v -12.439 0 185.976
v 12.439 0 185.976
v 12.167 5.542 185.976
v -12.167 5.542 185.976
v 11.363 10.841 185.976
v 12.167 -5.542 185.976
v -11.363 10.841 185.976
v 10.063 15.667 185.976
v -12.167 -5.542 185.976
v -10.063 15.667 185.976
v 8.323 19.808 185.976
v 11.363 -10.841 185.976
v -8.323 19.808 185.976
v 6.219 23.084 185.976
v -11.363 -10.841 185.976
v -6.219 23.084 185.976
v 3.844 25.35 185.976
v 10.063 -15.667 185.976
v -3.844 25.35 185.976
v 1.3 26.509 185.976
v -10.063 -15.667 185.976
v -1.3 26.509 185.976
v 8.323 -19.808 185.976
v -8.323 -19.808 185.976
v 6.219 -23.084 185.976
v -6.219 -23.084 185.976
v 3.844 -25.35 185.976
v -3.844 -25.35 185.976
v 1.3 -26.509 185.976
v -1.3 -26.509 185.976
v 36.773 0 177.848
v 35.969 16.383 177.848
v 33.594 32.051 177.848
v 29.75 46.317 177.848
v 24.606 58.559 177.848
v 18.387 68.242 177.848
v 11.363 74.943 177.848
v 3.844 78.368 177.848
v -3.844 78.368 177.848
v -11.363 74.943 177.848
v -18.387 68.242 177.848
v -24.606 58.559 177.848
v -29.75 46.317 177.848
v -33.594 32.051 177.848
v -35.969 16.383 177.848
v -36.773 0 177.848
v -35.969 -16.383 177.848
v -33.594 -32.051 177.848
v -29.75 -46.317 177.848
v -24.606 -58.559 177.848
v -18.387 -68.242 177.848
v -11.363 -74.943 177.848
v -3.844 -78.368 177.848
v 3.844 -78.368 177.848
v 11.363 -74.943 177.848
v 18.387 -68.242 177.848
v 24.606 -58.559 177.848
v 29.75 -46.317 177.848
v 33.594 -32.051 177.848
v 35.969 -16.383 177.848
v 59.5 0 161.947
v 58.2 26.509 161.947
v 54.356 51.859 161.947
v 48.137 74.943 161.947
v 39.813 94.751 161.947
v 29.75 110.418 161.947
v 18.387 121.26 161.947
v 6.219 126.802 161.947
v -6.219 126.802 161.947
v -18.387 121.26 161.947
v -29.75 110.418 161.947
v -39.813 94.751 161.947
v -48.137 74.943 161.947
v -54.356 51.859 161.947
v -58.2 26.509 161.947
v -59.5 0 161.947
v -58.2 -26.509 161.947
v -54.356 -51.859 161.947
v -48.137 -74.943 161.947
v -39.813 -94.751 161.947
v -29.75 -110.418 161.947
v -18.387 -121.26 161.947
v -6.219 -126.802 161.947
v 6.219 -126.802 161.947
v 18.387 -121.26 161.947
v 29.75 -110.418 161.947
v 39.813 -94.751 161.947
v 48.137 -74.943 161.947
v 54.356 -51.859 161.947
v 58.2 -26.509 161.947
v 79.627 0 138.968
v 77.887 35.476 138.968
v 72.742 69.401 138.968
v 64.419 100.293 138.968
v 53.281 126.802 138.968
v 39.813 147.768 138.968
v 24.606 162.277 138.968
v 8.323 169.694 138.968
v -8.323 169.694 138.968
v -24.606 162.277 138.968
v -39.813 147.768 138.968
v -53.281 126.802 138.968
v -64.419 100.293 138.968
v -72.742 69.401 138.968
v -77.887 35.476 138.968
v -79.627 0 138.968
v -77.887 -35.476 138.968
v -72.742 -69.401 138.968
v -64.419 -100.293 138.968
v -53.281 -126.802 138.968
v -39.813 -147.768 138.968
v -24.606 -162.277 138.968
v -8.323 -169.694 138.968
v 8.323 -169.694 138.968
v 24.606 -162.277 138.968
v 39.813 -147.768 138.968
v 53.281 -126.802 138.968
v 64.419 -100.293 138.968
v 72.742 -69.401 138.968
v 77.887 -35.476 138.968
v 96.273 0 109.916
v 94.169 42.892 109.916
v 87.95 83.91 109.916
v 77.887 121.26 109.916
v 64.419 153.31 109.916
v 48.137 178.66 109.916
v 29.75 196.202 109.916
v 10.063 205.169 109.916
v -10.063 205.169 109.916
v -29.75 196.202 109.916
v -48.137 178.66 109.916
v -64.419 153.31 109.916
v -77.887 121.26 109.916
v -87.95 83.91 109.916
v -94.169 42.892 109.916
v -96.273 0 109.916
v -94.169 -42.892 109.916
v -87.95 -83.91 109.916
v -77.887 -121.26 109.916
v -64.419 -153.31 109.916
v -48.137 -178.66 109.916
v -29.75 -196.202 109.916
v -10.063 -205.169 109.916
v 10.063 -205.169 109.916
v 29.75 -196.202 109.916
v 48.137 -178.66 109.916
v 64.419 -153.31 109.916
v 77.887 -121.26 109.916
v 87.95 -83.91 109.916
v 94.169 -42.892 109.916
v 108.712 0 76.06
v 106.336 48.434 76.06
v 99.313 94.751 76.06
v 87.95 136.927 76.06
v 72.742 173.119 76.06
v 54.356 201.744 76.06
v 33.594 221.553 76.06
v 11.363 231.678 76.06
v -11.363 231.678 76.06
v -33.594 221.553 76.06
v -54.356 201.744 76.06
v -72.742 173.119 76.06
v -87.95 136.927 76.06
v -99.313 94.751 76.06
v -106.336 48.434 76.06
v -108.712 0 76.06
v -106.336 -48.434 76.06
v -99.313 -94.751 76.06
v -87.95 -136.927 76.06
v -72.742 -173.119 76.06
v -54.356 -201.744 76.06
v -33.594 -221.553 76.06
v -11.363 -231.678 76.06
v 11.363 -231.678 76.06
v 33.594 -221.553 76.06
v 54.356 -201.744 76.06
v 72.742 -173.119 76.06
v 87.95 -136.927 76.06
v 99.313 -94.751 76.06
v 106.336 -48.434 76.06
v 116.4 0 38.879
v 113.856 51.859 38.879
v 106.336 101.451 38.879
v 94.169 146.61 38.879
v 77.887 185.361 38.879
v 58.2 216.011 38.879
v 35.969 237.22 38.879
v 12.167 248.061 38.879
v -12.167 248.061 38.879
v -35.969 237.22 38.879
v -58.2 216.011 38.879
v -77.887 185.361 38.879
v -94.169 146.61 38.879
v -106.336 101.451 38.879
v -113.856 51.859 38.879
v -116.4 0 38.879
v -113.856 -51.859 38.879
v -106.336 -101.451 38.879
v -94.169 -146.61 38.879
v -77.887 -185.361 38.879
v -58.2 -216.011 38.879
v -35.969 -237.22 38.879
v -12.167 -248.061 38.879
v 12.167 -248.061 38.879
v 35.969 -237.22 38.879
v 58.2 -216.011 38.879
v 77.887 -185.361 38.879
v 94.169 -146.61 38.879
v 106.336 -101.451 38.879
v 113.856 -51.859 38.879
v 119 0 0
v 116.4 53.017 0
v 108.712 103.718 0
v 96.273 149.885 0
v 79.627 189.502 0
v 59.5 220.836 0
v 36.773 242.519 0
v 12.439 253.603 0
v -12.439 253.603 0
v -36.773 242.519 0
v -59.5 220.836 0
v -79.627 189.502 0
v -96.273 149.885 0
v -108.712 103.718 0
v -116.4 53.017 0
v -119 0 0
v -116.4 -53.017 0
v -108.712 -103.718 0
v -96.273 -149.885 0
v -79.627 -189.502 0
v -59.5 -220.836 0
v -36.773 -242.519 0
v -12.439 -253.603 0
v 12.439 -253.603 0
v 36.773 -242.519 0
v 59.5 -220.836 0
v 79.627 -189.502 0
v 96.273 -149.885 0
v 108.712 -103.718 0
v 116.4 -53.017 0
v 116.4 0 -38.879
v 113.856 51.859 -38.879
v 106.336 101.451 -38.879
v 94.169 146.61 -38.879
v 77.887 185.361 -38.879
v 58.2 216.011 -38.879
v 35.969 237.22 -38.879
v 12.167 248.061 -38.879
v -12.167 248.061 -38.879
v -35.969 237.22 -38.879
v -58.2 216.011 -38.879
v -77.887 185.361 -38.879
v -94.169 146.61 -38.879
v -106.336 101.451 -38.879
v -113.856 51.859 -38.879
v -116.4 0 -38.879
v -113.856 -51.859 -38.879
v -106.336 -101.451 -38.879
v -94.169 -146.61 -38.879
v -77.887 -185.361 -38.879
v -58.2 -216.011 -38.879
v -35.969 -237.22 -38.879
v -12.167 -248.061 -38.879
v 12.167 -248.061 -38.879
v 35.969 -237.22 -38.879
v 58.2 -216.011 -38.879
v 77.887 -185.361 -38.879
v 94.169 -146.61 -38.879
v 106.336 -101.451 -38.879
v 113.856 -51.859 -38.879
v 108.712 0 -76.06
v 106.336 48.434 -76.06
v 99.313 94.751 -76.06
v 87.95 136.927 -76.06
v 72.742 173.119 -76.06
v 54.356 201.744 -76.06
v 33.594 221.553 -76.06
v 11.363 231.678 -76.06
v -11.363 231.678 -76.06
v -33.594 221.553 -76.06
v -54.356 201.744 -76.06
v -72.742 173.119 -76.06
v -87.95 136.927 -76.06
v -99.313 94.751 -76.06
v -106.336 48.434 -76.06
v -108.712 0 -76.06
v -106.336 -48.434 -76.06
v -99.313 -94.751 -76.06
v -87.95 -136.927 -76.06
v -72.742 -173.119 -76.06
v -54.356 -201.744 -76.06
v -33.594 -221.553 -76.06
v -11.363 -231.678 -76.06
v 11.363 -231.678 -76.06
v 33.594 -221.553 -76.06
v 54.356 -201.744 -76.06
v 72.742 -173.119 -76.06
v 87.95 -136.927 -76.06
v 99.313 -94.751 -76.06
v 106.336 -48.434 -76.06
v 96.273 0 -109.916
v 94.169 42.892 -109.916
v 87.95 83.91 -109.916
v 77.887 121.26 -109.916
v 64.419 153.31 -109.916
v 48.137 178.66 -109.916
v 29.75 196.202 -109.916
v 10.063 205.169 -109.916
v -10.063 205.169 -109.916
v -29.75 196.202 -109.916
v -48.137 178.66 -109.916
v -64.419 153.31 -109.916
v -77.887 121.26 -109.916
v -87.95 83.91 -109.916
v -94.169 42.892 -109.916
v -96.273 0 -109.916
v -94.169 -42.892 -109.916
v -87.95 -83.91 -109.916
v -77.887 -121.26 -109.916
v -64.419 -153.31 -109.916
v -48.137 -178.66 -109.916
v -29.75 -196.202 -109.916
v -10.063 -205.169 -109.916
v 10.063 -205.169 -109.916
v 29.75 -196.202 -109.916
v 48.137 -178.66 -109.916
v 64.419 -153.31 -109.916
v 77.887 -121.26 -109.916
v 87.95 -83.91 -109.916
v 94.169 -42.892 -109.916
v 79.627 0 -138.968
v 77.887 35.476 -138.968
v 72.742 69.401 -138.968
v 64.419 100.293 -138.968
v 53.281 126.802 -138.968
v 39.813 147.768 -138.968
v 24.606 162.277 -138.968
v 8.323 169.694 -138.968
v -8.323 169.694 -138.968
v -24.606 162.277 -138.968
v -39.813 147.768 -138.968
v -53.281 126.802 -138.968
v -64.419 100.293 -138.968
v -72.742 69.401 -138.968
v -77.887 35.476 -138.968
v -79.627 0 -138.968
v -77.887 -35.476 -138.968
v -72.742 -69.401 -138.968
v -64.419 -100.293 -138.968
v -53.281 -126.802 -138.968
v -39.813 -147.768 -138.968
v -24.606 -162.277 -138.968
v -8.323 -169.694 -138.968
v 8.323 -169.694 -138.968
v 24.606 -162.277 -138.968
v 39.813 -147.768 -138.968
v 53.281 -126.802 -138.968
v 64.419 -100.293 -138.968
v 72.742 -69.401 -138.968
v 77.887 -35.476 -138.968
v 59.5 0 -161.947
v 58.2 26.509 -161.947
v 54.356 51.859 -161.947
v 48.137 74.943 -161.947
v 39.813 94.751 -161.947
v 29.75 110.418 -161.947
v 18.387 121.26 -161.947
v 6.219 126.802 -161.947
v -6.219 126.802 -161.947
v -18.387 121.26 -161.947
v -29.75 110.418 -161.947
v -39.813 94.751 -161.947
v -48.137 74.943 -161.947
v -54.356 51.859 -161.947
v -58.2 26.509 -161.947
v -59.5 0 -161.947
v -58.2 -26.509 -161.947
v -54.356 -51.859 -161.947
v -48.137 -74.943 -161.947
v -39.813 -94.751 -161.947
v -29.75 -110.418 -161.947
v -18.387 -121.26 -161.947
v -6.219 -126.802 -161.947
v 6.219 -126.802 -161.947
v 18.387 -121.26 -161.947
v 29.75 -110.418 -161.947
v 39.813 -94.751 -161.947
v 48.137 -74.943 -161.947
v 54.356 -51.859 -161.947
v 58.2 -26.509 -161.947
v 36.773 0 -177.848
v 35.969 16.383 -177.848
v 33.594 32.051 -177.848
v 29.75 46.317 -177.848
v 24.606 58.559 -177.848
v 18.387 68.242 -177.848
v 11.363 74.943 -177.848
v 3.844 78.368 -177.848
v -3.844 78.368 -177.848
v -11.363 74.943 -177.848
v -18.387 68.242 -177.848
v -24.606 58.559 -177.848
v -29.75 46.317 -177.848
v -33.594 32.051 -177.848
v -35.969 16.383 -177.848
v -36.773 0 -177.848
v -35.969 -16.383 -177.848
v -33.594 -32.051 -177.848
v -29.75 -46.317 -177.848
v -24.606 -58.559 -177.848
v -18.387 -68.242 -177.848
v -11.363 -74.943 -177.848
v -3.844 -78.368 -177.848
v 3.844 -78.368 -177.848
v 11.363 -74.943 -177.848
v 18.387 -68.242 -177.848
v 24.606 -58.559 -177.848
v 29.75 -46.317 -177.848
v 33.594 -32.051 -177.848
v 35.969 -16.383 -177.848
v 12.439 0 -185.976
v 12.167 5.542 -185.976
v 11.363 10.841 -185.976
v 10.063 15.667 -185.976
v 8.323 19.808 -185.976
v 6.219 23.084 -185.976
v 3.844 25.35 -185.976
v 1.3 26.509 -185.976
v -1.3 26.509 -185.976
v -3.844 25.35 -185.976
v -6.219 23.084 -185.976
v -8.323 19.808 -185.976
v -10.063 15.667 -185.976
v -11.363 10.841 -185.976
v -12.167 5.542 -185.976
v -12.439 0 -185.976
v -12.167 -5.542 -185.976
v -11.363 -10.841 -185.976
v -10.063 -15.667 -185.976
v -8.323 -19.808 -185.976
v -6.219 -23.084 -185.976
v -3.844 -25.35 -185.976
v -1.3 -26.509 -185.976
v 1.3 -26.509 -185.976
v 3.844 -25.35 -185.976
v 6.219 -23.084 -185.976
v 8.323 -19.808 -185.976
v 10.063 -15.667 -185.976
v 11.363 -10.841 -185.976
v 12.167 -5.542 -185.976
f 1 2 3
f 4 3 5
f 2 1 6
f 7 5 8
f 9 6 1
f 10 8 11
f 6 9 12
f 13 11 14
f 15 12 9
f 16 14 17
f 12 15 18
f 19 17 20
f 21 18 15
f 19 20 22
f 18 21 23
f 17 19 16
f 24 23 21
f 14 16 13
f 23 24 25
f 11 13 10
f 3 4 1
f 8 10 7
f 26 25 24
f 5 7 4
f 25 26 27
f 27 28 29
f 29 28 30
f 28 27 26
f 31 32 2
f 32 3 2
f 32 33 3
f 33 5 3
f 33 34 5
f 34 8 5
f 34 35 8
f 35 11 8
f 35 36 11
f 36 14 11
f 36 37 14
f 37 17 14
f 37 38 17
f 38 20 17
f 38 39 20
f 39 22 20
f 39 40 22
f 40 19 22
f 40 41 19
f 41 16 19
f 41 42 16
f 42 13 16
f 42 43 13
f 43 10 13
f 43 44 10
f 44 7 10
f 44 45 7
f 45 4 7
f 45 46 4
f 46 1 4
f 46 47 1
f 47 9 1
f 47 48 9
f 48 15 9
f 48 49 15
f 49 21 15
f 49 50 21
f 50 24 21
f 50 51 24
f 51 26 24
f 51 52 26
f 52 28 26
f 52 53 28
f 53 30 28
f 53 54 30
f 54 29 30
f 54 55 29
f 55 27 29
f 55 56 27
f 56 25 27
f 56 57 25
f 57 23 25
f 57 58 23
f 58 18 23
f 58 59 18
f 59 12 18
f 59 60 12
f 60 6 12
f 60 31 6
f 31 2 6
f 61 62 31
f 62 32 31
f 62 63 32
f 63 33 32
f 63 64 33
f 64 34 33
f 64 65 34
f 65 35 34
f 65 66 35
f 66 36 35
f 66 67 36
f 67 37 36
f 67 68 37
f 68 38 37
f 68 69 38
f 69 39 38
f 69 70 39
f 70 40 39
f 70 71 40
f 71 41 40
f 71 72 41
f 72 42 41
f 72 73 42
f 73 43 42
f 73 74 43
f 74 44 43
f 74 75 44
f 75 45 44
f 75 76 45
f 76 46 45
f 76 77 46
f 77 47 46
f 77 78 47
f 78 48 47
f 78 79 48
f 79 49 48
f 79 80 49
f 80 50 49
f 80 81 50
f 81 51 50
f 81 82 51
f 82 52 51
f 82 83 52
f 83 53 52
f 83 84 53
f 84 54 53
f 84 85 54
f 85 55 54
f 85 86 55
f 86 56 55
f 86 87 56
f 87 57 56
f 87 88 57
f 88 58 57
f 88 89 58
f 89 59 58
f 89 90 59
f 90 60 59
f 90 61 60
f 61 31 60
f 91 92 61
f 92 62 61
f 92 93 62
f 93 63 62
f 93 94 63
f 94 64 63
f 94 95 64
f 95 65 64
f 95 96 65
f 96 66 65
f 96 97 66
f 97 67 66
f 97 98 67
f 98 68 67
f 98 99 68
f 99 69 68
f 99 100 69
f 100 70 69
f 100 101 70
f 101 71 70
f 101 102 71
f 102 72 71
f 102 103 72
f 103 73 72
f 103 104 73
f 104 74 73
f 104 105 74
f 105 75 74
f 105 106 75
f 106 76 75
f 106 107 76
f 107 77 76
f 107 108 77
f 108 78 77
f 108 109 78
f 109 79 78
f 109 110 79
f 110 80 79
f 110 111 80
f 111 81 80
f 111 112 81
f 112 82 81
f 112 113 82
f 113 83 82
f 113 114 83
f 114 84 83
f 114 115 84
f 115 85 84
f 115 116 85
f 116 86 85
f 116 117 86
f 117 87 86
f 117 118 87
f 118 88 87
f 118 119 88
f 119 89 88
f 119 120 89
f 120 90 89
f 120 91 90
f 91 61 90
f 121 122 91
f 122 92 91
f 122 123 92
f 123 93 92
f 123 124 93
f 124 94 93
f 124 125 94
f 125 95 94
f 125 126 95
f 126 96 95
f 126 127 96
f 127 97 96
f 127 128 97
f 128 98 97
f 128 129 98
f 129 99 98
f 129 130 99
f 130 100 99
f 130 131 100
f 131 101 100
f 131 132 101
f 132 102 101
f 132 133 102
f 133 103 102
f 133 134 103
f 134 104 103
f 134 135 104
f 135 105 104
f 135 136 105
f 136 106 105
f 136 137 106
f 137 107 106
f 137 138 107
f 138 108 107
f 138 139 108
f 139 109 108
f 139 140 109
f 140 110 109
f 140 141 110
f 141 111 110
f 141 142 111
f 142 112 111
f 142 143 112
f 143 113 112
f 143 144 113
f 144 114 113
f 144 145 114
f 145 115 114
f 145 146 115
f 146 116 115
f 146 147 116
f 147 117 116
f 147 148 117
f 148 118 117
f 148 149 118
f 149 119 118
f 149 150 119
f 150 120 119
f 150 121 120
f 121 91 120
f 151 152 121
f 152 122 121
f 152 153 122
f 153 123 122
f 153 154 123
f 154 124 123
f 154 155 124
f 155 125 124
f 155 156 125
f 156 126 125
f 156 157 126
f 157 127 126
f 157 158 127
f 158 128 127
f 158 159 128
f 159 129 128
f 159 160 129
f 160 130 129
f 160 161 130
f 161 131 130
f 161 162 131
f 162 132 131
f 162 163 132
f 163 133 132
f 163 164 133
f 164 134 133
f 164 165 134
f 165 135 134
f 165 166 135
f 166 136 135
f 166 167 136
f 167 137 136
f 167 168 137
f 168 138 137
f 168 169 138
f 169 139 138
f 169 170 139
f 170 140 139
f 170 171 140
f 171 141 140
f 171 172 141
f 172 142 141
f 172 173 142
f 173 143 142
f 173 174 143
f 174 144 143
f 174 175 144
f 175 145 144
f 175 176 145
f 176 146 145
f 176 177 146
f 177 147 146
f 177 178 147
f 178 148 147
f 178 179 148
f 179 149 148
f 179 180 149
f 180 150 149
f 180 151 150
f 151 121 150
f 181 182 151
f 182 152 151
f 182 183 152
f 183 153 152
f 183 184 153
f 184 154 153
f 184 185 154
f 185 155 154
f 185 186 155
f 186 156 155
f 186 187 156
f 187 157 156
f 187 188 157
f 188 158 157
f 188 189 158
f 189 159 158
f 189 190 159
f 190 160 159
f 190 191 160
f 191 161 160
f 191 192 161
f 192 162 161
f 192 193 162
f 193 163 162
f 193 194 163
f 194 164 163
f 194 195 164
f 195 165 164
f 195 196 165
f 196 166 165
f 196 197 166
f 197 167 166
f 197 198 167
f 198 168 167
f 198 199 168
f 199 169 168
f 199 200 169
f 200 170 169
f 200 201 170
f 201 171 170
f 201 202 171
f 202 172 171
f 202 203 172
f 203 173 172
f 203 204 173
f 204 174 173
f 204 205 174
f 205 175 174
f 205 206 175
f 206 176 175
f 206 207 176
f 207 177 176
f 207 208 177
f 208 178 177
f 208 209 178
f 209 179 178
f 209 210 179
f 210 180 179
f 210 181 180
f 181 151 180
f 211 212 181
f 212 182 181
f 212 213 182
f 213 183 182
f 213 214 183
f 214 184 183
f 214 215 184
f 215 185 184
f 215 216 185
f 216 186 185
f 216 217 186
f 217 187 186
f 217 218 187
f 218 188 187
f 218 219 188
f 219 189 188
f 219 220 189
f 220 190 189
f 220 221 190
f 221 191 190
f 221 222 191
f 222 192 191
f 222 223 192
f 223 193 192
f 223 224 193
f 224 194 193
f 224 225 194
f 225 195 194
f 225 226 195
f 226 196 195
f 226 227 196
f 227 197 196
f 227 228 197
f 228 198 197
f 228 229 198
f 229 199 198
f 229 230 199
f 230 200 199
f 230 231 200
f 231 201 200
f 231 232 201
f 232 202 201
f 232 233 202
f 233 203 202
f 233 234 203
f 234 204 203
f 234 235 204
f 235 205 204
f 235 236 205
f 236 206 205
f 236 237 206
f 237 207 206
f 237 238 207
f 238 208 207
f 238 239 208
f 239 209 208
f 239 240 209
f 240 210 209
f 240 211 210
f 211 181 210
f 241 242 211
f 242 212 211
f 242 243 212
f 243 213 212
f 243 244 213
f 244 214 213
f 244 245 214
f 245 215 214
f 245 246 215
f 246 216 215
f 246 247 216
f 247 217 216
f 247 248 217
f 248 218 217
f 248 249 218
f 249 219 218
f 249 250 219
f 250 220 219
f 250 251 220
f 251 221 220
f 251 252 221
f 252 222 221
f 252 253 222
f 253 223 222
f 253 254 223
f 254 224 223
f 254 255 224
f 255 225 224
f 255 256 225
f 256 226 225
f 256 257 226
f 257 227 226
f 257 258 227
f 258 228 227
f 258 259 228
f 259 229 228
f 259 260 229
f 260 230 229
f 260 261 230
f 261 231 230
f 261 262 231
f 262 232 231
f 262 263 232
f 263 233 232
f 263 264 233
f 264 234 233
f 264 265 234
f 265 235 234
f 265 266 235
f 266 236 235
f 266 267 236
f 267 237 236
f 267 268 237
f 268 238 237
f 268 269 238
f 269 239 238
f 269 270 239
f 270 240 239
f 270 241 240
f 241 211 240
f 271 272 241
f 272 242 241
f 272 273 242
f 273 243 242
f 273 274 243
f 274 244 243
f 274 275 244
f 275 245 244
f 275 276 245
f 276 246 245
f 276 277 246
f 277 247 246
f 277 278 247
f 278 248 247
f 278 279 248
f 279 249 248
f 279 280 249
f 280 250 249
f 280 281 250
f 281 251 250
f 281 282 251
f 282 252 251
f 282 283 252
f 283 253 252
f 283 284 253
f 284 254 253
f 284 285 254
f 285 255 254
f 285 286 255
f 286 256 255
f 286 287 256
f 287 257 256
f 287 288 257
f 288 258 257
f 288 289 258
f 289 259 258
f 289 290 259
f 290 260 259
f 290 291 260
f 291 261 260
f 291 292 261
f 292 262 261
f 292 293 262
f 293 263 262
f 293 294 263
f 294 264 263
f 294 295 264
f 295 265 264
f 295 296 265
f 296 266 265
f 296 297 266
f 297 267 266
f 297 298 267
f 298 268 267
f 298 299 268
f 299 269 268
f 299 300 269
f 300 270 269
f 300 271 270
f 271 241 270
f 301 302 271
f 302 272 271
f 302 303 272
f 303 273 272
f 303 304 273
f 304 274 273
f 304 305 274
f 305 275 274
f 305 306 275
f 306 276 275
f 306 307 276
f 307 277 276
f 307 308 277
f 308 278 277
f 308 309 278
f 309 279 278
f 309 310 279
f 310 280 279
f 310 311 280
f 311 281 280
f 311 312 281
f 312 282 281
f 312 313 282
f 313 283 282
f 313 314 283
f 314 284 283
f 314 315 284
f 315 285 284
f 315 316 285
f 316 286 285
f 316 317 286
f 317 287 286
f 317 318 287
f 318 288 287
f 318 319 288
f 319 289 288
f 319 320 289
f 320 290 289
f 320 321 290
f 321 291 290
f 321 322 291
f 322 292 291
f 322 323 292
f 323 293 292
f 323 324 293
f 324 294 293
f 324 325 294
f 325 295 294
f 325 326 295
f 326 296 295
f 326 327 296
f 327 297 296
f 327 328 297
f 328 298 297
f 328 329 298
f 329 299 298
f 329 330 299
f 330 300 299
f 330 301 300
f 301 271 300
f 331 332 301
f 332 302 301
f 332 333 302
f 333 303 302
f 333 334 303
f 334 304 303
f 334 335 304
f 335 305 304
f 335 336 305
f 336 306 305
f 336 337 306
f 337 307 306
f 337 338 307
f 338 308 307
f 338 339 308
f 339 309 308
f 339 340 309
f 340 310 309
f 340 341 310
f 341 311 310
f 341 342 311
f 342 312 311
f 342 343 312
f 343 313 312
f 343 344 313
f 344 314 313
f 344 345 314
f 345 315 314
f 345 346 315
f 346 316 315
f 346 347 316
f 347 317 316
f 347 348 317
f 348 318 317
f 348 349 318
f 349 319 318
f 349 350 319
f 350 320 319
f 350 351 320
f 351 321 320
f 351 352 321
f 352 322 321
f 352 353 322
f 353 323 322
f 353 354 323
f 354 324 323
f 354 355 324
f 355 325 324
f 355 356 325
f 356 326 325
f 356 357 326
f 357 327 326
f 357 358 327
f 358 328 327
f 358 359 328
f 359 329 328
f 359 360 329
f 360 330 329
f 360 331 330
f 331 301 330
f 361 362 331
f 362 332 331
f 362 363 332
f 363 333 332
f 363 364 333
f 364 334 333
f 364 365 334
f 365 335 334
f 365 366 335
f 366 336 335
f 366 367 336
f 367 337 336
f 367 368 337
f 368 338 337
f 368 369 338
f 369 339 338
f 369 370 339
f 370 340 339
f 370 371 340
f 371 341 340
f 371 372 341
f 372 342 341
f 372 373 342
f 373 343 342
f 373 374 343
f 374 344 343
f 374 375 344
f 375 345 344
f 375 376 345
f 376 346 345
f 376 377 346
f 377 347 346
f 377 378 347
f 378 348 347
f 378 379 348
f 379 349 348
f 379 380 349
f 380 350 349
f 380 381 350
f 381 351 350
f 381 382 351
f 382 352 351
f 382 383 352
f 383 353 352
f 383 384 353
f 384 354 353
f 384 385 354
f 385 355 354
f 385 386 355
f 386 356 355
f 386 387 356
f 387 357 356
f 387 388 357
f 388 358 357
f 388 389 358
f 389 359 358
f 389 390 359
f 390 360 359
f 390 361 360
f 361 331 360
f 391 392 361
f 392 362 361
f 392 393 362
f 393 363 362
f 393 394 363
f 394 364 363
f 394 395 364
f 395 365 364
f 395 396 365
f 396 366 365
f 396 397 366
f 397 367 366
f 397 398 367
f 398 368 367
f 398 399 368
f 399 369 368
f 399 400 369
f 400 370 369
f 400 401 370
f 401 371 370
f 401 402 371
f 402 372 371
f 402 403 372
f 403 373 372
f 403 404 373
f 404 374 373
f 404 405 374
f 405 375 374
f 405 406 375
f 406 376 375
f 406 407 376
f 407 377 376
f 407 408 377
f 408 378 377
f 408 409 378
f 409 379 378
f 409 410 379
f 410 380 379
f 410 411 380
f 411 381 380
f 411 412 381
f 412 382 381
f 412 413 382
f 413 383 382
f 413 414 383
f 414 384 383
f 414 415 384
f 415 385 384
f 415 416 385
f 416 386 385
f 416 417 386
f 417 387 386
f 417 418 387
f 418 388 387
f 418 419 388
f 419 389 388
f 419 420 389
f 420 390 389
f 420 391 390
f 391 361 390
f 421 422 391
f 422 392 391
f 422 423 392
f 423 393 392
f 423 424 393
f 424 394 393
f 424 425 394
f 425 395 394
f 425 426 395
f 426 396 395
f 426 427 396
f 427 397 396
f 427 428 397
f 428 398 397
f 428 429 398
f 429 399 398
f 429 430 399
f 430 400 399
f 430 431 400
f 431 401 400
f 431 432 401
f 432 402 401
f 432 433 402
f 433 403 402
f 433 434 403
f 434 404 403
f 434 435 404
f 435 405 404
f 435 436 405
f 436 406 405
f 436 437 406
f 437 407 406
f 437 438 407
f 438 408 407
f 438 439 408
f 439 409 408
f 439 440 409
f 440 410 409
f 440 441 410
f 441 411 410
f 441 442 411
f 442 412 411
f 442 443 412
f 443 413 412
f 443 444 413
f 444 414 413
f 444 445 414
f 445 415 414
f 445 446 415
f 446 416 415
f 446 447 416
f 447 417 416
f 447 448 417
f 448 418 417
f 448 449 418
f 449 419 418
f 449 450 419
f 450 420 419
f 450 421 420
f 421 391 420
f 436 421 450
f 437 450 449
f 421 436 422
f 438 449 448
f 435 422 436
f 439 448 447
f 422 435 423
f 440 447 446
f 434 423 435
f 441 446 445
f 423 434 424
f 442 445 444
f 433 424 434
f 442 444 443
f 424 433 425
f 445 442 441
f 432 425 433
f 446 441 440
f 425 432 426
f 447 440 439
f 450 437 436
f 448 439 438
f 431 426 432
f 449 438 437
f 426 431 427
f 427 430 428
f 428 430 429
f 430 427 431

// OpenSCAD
// Generated by SolidPython 1.0.1 on 2020-07-29 00:46:48


scale(v = [7, 15, 11]) {
	sphere(r = 17);
}
/***********************************************
*********      SolidPython code:      **********
************************************************
 
# import packages: SolidPython
from solid import *
from solid.utils import *
from itertools import chain, combinations, permutations


class Resize:

    def __init__(self, scad_file):
        self.scad_file = scad_file
        #self.scad_file = import_scad(scad_file)
        # cone/cylinder param:
        self.r1 = 0
        self.r2 = 0
        self.h = 0
        # rectangular prism param:
        self.w = 0
        self.l = 0
        # ellipse param:
        self.r = 0

    # import OpenScad code (file name corresponds to shape)


    # classify shape + parameters
    def assign(self, param1, param2, param3):
        if self.scad_file == 'cone.scad':
            self.r1 = param1
            self.r2 = param2
            self.h = param3
        elif self.scad_file == 'cylinder.scad':
            self.r1 = param1
            self.r2 = param2
            self.h = param3
        elif self.scad_file == 'rectangularPrism.scad':
            self.h = param1
            self.l = param2
            self.w = param3
        else:
            self.r = param1
            self.h = param2

    # resize parameters
    def iterate(self):
        x = range(3, 20, 2)
        i = 1
        if self.scad_file == 'cone.scad':
            tempList = list(permutations(x, 2))
            for temp in tempList:
                param1 = temp[0]
                param2 = temp[1]
                filepath = 'produced_scad_files/' + 'cone' + str(param1) + '_' + str(param2) + '_' + '.scad'
                scad_render_to_file(cylinder(h=param1, r1=param2, r2=0), filepath)

        elif self.scad_file == 'cylinder.scad':
            tempList = list(permutations(x, 3))
            for temp in tempList:
                param1 = temp[0]
                param2 = temp[1]
                filepath = 'produced_scad_files/' + 'cylinder' + str(param1) + '_' + str(param2) + '_' + '.scad'
                scad_render_to_file(cylinder(h=param1, r1=param2, r2=param2), filepath)

        elif self.scad_file == 'rectangularPrism.scad':
            tempList = list(permutations(x, 3))
            for temp in tempList:
                param1 = temp[0]
                param2 = temp[1]
                param3 = temp[2]
                filepath = 'produced_scad_files/' + 'rectangularPrism' + str(param1) + '_' + str(param2) + '_' + str(
                    param3) + '.scad'
                scad_render_to_file(cube(size=(param1, param2, param3)), filepath)

        elif self.scad_file == 'ellipse.scad':
            tempList = list(permutations(x, 4))
            for temp in tempList:
                param1 = temp[0]
                param2 = temp[1]
                param3 = temp[2]
                param4 = temp[3]
                filepath = 'produced_scad_files/' + 'ellipse' + str(param1) + '_' + str(param2) + '_' + str(param3) + '_' + str(param4) + '.scad'
                scad_render_to_file(scale([param1, param2, param3])(sphere(r=param4)), filepath)

    def render_to_scadfile(self):
        scad_render_to_file(scad, 'example.scad') 
 
************************************************/
